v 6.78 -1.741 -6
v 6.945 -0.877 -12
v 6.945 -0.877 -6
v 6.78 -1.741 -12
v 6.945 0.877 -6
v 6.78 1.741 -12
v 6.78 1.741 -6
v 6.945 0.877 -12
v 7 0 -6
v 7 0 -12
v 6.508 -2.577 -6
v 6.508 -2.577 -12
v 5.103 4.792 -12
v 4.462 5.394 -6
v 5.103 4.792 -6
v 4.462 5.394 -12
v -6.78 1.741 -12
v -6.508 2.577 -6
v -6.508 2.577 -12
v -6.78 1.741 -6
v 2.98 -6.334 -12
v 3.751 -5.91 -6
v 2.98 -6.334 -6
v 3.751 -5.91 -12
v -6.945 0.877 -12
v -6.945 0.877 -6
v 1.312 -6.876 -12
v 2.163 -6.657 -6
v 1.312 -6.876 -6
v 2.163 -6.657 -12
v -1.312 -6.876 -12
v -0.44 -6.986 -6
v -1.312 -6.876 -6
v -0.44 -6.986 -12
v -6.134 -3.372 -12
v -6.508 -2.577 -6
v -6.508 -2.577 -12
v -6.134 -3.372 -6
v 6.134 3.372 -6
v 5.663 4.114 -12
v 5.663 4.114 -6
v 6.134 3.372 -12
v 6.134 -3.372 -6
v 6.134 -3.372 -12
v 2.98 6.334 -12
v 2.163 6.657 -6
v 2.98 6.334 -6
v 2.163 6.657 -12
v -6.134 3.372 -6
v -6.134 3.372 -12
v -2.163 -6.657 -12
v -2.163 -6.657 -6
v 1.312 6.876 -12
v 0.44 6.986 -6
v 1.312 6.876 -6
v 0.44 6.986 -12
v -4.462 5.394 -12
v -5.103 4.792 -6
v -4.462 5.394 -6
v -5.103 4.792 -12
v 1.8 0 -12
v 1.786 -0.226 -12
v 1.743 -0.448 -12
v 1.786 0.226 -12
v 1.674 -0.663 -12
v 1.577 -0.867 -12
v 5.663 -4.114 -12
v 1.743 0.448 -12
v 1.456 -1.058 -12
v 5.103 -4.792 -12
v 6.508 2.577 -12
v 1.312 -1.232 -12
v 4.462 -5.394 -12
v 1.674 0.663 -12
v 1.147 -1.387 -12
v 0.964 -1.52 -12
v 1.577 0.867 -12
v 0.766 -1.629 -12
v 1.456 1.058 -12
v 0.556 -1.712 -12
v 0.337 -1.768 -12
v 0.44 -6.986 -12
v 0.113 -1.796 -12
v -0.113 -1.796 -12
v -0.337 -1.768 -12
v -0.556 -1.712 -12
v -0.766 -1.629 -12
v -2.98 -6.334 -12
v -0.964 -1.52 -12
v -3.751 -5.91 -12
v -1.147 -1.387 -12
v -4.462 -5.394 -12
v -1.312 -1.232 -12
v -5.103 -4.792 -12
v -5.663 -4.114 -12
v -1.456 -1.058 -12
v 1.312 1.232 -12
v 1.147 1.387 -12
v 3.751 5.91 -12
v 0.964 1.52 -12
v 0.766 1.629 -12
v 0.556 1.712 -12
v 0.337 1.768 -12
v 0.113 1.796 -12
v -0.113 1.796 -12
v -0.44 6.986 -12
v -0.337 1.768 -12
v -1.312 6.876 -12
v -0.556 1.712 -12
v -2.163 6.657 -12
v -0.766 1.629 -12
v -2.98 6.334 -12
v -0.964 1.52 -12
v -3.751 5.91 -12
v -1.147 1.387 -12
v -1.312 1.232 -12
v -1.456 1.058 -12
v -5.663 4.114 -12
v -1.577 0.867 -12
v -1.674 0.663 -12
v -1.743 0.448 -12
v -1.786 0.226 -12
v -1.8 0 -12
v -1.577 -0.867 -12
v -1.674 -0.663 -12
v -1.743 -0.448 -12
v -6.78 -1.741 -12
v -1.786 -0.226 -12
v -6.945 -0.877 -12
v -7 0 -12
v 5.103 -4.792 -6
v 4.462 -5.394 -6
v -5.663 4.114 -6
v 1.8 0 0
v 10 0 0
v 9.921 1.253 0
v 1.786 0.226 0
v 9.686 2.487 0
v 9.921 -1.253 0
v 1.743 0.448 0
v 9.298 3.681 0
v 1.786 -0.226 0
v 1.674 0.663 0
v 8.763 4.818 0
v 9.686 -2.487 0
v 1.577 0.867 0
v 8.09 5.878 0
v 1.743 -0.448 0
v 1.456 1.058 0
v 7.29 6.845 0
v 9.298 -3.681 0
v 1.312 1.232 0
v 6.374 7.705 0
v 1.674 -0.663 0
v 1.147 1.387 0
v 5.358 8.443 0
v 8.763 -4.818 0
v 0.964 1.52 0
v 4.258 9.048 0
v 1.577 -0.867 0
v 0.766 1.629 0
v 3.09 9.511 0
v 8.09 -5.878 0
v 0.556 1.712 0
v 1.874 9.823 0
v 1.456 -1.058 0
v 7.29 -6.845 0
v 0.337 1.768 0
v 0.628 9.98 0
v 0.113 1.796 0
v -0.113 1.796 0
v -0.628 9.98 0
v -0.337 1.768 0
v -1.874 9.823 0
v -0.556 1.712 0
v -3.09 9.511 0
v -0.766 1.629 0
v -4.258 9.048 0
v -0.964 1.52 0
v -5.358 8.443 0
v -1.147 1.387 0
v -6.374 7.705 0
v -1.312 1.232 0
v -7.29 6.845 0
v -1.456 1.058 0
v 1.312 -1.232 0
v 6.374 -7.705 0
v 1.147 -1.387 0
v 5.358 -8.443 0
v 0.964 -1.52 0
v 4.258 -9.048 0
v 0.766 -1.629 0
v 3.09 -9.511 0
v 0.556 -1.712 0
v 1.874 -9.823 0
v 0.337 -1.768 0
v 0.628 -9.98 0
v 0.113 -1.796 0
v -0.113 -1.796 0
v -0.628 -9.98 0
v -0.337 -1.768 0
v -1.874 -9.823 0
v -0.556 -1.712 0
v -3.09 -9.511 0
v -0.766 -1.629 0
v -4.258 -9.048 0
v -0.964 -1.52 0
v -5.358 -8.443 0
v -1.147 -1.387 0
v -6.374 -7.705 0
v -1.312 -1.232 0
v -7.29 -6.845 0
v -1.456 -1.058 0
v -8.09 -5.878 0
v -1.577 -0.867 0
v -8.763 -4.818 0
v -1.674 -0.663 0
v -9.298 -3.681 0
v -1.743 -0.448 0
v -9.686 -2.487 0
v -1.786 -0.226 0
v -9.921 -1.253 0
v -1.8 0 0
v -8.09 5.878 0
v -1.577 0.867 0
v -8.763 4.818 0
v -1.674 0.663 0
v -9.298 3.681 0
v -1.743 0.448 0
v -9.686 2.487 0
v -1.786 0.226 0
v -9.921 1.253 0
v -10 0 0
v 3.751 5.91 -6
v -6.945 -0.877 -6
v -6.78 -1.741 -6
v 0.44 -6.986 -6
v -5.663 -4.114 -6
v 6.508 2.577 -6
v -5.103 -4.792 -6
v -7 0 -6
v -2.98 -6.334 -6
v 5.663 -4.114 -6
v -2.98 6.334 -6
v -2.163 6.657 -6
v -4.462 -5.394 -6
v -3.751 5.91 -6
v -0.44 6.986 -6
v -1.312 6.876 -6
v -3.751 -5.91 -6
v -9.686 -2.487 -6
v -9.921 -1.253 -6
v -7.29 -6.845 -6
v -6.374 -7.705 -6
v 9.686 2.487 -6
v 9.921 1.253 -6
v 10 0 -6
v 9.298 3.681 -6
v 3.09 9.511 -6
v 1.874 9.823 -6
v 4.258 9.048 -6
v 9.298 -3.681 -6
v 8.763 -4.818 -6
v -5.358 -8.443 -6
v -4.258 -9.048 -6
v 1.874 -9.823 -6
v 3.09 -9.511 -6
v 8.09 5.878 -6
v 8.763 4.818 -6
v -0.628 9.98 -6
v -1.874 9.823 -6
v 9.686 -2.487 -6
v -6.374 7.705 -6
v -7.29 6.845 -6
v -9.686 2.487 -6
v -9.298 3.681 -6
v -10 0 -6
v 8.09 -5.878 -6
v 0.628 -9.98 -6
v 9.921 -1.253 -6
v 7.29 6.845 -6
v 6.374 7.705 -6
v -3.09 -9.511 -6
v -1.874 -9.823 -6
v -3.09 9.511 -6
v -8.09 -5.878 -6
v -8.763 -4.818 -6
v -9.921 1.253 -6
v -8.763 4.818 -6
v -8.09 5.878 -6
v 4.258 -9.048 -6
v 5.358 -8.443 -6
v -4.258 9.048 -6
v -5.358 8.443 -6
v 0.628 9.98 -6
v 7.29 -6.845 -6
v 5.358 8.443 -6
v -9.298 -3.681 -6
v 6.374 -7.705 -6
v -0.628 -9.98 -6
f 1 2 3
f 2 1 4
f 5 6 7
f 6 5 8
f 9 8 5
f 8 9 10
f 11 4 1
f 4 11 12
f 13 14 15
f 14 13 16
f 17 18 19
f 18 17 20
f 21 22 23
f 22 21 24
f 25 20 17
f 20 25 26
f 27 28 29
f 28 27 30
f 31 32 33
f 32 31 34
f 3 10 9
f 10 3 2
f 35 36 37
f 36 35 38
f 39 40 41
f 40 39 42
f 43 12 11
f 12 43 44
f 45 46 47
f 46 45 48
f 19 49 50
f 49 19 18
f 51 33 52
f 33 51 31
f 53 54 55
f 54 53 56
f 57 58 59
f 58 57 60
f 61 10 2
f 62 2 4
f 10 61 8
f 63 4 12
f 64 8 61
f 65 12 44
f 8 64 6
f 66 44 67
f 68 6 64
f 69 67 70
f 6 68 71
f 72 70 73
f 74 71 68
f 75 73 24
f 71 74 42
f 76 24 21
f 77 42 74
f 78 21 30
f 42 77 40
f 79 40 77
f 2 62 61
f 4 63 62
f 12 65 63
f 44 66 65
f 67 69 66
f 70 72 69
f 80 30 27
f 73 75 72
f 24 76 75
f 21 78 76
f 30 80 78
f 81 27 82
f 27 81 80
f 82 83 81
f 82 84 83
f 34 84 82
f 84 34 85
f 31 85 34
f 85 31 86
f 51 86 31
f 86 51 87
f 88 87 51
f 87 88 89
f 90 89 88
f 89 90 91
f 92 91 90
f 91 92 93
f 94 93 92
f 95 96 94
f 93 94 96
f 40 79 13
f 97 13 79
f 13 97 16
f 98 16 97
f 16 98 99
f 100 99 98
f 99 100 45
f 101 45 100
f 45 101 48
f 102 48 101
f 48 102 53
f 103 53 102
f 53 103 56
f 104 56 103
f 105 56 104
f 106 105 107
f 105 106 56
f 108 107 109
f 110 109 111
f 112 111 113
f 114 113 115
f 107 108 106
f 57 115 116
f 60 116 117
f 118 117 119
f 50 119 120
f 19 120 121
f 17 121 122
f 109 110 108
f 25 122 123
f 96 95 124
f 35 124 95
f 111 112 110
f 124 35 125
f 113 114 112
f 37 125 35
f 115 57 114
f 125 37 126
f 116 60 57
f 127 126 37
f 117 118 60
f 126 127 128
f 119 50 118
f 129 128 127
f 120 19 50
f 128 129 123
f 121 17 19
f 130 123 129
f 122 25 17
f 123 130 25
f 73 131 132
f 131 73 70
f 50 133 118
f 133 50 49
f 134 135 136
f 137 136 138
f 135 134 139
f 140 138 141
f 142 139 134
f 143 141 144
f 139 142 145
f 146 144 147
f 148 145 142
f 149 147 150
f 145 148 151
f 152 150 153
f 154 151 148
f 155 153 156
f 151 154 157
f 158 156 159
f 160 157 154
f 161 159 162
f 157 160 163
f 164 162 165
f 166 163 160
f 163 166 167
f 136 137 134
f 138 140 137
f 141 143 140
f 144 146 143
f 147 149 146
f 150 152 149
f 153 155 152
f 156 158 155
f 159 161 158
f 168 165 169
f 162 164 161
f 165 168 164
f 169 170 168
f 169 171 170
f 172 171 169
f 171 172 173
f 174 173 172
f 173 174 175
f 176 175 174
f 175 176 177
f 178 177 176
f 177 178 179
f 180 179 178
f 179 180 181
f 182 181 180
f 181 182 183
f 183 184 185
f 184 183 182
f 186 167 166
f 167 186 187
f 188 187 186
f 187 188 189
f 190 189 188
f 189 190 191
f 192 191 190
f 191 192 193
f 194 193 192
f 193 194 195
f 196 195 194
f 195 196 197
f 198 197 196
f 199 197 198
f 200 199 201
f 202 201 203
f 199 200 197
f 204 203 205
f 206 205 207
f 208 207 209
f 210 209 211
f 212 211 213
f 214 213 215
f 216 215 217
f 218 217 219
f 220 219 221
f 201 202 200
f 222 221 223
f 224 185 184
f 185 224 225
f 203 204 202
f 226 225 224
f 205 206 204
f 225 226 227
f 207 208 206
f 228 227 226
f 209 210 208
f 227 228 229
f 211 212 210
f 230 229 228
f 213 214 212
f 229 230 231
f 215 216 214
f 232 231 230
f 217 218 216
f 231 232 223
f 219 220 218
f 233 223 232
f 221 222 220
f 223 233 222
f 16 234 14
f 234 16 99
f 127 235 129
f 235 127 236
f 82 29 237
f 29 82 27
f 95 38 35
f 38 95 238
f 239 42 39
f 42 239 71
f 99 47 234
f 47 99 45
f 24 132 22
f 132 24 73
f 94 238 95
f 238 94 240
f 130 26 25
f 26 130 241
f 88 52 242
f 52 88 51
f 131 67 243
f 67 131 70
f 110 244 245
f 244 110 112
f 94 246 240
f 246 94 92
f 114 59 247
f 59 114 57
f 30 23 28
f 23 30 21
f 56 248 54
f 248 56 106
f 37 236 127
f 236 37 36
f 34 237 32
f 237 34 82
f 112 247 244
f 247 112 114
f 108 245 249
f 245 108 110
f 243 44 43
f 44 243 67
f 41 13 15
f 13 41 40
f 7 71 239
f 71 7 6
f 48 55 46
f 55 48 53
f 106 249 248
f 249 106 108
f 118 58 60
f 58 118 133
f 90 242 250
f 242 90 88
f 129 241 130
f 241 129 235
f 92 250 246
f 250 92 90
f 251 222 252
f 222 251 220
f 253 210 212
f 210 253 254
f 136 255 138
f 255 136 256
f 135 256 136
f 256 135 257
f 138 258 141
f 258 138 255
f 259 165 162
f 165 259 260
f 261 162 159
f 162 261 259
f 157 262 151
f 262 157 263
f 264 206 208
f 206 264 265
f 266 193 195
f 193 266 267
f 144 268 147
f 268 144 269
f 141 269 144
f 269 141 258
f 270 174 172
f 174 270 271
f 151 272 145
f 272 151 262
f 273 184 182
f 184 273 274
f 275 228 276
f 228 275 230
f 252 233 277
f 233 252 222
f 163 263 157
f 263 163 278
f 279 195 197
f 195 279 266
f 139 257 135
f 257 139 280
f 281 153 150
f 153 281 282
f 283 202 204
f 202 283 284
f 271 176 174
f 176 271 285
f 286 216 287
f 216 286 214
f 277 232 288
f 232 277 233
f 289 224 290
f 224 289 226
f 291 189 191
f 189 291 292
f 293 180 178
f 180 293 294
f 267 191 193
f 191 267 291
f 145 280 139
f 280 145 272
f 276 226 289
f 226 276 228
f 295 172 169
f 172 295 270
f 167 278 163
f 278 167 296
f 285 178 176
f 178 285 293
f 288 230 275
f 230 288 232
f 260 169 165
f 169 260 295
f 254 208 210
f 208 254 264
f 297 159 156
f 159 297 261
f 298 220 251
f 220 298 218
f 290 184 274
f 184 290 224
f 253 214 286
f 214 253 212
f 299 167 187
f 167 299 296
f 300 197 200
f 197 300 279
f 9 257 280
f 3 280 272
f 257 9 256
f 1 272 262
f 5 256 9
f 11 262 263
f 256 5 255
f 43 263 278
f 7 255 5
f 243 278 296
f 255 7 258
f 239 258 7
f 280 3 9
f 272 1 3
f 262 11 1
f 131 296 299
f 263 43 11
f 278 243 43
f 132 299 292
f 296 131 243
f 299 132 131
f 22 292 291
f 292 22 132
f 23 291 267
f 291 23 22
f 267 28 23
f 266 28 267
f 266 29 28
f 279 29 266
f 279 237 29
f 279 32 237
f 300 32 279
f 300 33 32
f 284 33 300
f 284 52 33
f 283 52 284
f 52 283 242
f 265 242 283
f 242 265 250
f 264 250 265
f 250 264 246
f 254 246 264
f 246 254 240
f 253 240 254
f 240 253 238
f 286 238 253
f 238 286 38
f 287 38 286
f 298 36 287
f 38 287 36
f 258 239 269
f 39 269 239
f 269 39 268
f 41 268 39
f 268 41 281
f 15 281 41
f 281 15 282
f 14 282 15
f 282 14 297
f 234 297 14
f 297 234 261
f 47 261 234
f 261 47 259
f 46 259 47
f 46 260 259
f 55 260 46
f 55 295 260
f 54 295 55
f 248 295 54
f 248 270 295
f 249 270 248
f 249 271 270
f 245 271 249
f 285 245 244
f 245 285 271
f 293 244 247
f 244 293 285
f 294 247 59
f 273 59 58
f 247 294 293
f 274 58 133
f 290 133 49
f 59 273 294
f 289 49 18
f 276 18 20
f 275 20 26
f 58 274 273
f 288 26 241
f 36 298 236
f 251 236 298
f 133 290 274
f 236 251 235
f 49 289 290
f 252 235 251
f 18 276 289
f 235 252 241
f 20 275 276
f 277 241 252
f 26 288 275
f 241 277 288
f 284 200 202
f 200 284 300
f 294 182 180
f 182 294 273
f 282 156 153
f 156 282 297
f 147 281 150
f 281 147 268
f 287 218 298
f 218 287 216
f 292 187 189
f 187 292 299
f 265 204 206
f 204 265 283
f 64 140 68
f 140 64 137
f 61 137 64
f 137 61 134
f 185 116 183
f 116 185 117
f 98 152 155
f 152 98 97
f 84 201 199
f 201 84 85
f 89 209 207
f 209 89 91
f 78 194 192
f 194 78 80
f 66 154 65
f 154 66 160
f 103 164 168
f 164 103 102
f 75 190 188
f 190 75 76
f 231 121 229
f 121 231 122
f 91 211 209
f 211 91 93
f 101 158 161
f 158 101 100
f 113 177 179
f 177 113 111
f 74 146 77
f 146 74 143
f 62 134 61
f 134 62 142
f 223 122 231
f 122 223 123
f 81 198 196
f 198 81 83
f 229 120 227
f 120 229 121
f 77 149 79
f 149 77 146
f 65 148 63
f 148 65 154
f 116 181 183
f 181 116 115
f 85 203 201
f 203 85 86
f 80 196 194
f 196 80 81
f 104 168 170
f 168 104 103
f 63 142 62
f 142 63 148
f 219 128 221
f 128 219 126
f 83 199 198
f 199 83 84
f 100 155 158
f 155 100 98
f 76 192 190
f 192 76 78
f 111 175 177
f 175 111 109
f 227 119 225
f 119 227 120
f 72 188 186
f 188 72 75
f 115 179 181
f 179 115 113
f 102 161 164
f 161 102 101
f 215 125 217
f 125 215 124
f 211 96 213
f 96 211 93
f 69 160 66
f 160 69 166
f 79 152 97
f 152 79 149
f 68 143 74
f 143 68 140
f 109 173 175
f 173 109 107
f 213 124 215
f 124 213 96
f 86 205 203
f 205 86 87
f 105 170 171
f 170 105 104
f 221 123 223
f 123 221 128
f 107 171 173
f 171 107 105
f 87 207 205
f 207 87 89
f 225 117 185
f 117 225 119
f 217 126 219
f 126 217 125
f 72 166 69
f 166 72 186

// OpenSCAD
$fn = 50;


difference() {
	union() {
		translate(v = [0, 0, -12.0000000000]) {
			cylinder(h = 12, r = 7.0000000000);
		}
		translate(v = [0, 0, -6.0000000000]) {
			cylinder(h = 6, r = 10.0000000000);
		}
	}
	union() {
		#translate(v = [0, 0, -12]) {
			cylinder(h = 12, r = 1.8000000000);
		}
	}
}
